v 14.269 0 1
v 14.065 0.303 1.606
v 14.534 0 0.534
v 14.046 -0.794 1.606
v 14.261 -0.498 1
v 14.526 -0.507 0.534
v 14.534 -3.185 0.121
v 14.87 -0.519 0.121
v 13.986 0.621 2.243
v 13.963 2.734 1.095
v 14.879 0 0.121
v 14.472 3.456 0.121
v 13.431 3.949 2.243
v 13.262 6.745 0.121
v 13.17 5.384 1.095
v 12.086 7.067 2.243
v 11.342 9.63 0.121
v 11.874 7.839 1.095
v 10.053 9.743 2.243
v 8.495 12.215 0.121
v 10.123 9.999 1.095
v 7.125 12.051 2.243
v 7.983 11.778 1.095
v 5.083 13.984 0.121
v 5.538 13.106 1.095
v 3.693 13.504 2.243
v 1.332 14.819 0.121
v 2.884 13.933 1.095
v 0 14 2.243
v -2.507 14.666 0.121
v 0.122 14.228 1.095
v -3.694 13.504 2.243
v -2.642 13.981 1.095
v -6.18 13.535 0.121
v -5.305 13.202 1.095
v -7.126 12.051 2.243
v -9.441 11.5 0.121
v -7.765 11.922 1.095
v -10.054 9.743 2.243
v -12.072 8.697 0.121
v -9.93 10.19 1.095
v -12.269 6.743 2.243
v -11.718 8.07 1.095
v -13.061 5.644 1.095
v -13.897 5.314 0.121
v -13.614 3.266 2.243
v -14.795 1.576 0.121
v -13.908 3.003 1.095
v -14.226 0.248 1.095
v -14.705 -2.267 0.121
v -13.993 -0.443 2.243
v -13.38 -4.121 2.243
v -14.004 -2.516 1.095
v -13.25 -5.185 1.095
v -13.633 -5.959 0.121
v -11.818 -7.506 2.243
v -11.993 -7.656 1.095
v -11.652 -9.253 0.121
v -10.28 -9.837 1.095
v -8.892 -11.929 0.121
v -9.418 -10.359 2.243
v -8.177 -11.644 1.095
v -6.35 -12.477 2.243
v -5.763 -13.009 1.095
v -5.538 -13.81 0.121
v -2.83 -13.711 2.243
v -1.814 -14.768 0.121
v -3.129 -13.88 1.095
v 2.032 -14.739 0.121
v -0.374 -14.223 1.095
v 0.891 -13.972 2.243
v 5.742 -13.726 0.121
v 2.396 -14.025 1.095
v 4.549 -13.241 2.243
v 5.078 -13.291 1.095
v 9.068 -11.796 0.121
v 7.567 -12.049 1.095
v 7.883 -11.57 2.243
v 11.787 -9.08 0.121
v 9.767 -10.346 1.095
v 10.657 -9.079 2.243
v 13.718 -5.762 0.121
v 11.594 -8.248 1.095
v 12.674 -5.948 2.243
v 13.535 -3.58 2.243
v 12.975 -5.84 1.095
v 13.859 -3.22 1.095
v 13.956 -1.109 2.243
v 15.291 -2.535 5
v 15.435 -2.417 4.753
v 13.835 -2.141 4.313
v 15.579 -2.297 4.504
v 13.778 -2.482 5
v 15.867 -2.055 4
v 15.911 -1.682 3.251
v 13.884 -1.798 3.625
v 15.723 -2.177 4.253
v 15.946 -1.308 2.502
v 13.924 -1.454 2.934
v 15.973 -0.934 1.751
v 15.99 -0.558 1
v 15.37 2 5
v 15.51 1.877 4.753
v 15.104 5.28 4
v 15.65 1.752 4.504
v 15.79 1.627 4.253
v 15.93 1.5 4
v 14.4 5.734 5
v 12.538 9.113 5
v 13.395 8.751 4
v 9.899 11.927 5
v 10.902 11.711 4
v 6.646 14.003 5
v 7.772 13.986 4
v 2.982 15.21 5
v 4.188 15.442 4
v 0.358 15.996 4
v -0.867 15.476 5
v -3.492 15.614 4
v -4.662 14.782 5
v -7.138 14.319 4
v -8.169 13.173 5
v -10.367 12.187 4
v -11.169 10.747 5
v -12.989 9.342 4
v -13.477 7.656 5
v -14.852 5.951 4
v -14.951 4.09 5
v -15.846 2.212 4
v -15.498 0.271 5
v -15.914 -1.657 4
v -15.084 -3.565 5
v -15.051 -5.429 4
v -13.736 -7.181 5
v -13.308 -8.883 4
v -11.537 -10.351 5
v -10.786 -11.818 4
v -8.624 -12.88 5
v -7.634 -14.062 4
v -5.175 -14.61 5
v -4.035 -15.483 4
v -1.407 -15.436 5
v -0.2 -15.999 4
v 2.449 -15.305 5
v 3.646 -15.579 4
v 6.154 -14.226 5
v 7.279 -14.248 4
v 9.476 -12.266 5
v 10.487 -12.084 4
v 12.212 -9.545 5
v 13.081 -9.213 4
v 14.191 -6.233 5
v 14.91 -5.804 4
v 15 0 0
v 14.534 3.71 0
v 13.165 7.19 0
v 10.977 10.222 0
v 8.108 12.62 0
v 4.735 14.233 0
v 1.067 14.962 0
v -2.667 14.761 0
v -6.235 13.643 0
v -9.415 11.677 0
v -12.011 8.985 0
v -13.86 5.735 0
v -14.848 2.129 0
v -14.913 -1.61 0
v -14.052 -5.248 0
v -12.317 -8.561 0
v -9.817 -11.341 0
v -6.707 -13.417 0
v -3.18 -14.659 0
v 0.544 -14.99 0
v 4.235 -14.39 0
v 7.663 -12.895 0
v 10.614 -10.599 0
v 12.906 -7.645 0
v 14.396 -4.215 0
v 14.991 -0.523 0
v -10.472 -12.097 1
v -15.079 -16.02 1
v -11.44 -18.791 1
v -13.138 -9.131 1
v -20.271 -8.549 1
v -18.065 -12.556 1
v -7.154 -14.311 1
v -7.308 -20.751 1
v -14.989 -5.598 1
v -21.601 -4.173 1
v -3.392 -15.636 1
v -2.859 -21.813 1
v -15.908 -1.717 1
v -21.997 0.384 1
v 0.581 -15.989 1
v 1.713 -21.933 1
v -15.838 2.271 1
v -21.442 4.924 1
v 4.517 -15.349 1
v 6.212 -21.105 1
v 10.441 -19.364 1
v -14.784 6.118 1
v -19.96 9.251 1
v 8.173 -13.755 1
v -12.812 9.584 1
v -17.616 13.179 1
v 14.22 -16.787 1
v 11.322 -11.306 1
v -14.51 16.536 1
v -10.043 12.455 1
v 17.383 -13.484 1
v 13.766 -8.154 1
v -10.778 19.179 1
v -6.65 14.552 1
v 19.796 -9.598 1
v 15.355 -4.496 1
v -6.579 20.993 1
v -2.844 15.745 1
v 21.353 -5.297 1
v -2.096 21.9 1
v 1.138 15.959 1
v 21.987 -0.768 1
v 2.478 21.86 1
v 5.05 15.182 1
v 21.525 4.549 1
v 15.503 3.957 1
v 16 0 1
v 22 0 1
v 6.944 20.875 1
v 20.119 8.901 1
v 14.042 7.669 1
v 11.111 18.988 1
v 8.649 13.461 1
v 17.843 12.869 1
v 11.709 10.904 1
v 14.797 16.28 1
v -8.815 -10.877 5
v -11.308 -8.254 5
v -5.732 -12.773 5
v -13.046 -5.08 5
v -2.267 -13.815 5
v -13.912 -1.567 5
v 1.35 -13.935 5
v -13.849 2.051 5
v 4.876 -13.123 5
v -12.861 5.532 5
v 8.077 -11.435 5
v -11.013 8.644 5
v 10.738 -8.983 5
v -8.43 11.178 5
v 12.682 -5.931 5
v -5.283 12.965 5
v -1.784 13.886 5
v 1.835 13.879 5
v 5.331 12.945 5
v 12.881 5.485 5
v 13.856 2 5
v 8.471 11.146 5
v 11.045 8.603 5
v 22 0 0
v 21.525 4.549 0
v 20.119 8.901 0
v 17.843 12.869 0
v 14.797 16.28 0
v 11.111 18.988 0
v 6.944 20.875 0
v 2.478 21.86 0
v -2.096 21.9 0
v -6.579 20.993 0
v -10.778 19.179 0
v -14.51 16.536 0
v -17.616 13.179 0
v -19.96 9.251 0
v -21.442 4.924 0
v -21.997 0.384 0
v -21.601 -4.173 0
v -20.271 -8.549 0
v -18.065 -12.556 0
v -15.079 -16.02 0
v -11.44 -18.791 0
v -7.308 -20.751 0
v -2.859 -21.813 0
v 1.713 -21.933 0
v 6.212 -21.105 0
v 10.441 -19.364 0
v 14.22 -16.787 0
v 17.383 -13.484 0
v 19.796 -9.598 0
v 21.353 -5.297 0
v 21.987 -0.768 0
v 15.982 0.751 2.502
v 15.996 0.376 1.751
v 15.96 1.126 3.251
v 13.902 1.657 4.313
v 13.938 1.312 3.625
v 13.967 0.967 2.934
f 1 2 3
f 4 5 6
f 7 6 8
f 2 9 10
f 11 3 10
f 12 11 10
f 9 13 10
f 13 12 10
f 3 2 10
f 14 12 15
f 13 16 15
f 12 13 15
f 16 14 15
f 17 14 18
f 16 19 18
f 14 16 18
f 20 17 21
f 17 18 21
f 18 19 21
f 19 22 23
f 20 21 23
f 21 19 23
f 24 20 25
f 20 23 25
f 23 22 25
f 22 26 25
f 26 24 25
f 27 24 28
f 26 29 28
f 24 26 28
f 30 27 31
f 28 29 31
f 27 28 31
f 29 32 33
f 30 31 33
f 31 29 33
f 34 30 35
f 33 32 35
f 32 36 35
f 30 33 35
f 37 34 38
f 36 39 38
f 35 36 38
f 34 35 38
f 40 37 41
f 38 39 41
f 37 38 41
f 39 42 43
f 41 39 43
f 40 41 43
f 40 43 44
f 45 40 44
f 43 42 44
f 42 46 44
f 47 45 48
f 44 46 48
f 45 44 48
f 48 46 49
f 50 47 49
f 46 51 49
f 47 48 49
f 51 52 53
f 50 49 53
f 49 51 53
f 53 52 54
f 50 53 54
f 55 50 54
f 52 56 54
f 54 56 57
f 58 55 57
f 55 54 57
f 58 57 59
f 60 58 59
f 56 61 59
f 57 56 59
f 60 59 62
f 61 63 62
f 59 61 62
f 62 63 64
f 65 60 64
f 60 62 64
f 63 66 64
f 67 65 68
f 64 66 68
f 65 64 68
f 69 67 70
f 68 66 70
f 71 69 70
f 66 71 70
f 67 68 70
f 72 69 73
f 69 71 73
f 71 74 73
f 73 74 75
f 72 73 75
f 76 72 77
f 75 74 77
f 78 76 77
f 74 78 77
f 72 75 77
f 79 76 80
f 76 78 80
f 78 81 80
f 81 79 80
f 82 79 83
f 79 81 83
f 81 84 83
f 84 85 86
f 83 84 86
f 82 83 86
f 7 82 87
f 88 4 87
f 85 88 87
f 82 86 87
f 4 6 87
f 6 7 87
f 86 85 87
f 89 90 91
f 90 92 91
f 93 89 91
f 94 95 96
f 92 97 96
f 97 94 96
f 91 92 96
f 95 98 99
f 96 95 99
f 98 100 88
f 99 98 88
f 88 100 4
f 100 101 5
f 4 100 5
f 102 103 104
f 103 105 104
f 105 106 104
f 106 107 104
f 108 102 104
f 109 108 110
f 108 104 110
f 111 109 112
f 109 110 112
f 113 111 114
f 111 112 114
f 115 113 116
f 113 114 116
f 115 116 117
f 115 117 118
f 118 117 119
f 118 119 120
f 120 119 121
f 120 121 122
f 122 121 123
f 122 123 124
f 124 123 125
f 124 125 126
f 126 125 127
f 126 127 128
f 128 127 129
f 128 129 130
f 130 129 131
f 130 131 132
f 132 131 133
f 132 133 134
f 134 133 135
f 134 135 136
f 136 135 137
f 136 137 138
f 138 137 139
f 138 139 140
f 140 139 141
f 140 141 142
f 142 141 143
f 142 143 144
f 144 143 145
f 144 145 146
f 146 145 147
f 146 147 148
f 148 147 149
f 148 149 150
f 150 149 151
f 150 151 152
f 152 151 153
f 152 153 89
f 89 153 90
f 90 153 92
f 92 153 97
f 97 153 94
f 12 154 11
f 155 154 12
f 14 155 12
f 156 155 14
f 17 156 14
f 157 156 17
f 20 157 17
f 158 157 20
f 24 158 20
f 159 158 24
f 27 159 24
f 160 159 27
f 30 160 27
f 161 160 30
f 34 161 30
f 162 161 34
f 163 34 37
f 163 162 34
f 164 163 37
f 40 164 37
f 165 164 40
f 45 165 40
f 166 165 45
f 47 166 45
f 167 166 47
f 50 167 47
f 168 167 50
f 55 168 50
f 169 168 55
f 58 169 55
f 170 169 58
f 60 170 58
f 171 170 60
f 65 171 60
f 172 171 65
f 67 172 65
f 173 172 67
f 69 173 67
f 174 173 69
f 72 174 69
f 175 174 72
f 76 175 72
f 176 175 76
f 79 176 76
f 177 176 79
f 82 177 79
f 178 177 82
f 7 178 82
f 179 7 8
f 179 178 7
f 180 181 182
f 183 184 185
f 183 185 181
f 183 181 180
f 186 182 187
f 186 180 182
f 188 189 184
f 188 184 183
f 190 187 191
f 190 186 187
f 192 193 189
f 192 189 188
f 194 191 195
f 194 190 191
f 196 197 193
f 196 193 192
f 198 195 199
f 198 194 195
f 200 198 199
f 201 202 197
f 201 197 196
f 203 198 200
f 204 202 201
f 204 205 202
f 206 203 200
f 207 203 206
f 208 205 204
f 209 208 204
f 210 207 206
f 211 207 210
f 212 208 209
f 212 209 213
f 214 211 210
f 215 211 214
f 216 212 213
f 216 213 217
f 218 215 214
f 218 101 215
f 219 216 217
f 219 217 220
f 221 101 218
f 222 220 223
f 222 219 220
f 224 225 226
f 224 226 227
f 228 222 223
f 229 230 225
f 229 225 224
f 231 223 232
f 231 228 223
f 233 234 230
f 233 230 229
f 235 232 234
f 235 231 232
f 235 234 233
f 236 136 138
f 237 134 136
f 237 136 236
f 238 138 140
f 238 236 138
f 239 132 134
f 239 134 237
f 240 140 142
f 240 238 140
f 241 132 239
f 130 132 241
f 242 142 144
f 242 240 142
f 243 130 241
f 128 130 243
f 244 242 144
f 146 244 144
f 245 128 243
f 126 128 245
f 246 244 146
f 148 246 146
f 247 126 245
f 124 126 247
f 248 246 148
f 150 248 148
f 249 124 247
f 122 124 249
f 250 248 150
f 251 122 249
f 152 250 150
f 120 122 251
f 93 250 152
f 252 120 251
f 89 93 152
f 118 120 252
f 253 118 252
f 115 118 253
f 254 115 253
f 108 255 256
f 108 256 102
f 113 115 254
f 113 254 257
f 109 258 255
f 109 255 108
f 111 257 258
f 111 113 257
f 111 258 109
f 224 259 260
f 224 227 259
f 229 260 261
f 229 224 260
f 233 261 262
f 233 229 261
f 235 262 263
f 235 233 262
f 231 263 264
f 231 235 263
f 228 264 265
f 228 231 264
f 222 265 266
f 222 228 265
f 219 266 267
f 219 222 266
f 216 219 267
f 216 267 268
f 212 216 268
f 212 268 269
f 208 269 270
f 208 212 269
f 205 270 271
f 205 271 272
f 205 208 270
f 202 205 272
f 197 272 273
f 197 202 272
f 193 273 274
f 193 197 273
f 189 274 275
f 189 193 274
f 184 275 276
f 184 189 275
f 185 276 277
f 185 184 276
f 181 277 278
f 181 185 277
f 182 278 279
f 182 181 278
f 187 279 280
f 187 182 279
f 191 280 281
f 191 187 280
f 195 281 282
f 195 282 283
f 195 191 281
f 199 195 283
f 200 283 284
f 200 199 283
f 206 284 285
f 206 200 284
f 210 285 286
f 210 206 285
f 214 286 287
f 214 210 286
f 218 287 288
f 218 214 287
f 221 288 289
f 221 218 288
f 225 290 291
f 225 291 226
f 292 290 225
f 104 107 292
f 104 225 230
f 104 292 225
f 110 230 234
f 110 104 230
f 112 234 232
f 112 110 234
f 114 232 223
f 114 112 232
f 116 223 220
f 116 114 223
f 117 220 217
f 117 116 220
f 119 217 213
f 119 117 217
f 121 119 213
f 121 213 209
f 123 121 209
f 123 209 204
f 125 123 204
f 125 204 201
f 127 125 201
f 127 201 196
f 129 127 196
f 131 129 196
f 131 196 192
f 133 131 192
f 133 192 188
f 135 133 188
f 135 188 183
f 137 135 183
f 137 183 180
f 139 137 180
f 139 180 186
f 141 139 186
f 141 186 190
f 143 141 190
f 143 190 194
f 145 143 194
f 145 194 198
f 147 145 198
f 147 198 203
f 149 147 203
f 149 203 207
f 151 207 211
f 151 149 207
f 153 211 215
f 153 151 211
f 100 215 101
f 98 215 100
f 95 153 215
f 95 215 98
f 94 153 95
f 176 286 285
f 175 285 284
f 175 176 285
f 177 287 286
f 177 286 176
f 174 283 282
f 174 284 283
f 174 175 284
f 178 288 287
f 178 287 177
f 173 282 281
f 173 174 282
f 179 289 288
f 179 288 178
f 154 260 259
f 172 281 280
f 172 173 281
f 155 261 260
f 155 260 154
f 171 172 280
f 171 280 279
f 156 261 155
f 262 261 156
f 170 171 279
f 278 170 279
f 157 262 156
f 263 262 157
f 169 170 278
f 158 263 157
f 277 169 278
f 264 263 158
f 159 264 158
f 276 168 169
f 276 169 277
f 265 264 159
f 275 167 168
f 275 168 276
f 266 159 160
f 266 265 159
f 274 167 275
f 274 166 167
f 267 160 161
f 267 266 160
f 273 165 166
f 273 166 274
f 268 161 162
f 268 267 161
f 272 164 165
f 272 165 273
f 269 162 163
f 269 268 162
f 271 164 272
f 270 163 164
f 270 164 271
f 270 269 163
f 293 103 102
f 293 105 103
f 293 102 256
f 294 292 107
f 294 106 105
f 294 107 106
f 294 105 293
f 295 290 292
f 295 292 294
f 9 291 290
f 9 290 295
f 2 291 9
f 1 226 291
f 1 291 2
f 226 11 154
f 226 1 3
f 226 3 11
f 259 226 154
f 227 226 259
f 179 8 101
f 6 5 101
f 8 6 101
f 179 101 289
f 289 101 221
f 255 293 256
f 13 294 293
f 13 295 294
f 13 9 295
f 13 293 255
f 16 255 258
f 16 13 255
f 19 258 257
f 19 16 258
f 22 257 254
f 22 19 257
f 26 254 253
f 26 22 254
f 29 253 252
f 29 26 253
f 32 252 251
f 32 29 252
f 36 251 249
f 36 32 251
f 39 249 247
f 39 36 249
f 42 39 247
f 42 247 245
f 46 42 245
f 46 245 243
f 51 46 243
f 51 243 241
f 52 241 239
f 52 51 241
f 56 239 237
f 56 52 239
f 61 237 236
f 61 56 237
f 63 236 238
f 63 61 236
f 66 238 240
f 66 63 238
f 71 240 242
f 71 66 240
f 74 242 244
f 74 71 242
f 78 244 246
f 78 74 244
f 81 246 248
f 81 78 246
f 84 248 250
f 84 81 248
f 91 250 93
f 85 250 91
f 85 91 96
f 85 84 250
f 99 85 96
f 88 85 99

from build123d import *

# Parameters (mm, degrees)
F1_ANGLE    = 358
F2_C1_SIZE2 = 4
F2_C1_SIZE  = 2
F2_C2_SIZE2 = 4
F2_C2_SIZE  = 2
F3_SIZE     = 1
F4_R        = 3
F5_T2_ANGLE = 359.64


# Not quite as in the source:
# - a fillet or chamfer that OpenCascade refuses, or shapes differently, is made with other operations: its cross-section is extruded or revolved along the edge and cut away or added


with BuildPart() as f1:
    # F0 (on Front) → F1 (revolve)
    with BuildSketch(Plane.XZ):
        Polygon((14, 0), (22, 0), (22, 1), (16, 1), (16, 5), (14, 5), align=None)
    revolve(axis=Axis((0, 0, -0.0525576656), (0, 0, 1)), revolution_arc=F1_ANGLE)

    # F2: chamfer of 4 x 2 on 2 edges, made by hand

    # F2_c1
    f2_c1_edges = [f1.edges().sort_by_distance(p)[0] for p in [
        (15, 0, 5),
    ]]
    f2_c1_side = f1.faces().sort_by_distance((15, 0.04, 5))[0]
    chamfer(f2_c1_edges, length=F2_C1_SIZE, length2=F2_C1_SIZE2, reference=f2_c1_side)

    # F2_c2
    f2_c2_edges = [f1.edges().sort_by_distance(p)[0] for p in [
        (14.9908624053, -0.5234924505, 5),
    ]]
    f2_c2_side = f1.faces().sort_by_distance((14.9894664254, -0.5634680836, 5))[0]
    chamfer(f2_c2_edges, length=F2_C2_SIZE, length2=F2_C2_SIZE2, reference=f2_c2_side)

    # F3
    f3_edges = [f1.edges().sort_by_distance(p)[0] for p in [
        (-13.997868, 0.244334, 0),
    ]]
    chamfer(f3_edges, length=F3_SIZE)

    # F4
    f4_edges = [f1.edges().sort_by_distance(p)[0] for p in [
        (-13.997868, 0.244334, 1),
    ]]
    fillet(f4_edges, radius=F4_R)

    # F5: chamfer of 1 x 0.5 on 1 edges, made by hand

    # F5_s1 → F5_t2 (revolve, cut)
    with BuildSketch(Plane(origin=(0, 0, 0), x_dir=(0, 0, 1), z_dir=(-0.0143112113, -0.9998975894, 0))):
        Polygon((5, -15.5), (4, -16), (5, -16), align=None)
    revolve(axis=Axis((0, 0, 5), (0, 0, 1)), revolution_arc=F5_T2_ANGLE, mode=Mode.SUBTRACT)


solid = f1.part
